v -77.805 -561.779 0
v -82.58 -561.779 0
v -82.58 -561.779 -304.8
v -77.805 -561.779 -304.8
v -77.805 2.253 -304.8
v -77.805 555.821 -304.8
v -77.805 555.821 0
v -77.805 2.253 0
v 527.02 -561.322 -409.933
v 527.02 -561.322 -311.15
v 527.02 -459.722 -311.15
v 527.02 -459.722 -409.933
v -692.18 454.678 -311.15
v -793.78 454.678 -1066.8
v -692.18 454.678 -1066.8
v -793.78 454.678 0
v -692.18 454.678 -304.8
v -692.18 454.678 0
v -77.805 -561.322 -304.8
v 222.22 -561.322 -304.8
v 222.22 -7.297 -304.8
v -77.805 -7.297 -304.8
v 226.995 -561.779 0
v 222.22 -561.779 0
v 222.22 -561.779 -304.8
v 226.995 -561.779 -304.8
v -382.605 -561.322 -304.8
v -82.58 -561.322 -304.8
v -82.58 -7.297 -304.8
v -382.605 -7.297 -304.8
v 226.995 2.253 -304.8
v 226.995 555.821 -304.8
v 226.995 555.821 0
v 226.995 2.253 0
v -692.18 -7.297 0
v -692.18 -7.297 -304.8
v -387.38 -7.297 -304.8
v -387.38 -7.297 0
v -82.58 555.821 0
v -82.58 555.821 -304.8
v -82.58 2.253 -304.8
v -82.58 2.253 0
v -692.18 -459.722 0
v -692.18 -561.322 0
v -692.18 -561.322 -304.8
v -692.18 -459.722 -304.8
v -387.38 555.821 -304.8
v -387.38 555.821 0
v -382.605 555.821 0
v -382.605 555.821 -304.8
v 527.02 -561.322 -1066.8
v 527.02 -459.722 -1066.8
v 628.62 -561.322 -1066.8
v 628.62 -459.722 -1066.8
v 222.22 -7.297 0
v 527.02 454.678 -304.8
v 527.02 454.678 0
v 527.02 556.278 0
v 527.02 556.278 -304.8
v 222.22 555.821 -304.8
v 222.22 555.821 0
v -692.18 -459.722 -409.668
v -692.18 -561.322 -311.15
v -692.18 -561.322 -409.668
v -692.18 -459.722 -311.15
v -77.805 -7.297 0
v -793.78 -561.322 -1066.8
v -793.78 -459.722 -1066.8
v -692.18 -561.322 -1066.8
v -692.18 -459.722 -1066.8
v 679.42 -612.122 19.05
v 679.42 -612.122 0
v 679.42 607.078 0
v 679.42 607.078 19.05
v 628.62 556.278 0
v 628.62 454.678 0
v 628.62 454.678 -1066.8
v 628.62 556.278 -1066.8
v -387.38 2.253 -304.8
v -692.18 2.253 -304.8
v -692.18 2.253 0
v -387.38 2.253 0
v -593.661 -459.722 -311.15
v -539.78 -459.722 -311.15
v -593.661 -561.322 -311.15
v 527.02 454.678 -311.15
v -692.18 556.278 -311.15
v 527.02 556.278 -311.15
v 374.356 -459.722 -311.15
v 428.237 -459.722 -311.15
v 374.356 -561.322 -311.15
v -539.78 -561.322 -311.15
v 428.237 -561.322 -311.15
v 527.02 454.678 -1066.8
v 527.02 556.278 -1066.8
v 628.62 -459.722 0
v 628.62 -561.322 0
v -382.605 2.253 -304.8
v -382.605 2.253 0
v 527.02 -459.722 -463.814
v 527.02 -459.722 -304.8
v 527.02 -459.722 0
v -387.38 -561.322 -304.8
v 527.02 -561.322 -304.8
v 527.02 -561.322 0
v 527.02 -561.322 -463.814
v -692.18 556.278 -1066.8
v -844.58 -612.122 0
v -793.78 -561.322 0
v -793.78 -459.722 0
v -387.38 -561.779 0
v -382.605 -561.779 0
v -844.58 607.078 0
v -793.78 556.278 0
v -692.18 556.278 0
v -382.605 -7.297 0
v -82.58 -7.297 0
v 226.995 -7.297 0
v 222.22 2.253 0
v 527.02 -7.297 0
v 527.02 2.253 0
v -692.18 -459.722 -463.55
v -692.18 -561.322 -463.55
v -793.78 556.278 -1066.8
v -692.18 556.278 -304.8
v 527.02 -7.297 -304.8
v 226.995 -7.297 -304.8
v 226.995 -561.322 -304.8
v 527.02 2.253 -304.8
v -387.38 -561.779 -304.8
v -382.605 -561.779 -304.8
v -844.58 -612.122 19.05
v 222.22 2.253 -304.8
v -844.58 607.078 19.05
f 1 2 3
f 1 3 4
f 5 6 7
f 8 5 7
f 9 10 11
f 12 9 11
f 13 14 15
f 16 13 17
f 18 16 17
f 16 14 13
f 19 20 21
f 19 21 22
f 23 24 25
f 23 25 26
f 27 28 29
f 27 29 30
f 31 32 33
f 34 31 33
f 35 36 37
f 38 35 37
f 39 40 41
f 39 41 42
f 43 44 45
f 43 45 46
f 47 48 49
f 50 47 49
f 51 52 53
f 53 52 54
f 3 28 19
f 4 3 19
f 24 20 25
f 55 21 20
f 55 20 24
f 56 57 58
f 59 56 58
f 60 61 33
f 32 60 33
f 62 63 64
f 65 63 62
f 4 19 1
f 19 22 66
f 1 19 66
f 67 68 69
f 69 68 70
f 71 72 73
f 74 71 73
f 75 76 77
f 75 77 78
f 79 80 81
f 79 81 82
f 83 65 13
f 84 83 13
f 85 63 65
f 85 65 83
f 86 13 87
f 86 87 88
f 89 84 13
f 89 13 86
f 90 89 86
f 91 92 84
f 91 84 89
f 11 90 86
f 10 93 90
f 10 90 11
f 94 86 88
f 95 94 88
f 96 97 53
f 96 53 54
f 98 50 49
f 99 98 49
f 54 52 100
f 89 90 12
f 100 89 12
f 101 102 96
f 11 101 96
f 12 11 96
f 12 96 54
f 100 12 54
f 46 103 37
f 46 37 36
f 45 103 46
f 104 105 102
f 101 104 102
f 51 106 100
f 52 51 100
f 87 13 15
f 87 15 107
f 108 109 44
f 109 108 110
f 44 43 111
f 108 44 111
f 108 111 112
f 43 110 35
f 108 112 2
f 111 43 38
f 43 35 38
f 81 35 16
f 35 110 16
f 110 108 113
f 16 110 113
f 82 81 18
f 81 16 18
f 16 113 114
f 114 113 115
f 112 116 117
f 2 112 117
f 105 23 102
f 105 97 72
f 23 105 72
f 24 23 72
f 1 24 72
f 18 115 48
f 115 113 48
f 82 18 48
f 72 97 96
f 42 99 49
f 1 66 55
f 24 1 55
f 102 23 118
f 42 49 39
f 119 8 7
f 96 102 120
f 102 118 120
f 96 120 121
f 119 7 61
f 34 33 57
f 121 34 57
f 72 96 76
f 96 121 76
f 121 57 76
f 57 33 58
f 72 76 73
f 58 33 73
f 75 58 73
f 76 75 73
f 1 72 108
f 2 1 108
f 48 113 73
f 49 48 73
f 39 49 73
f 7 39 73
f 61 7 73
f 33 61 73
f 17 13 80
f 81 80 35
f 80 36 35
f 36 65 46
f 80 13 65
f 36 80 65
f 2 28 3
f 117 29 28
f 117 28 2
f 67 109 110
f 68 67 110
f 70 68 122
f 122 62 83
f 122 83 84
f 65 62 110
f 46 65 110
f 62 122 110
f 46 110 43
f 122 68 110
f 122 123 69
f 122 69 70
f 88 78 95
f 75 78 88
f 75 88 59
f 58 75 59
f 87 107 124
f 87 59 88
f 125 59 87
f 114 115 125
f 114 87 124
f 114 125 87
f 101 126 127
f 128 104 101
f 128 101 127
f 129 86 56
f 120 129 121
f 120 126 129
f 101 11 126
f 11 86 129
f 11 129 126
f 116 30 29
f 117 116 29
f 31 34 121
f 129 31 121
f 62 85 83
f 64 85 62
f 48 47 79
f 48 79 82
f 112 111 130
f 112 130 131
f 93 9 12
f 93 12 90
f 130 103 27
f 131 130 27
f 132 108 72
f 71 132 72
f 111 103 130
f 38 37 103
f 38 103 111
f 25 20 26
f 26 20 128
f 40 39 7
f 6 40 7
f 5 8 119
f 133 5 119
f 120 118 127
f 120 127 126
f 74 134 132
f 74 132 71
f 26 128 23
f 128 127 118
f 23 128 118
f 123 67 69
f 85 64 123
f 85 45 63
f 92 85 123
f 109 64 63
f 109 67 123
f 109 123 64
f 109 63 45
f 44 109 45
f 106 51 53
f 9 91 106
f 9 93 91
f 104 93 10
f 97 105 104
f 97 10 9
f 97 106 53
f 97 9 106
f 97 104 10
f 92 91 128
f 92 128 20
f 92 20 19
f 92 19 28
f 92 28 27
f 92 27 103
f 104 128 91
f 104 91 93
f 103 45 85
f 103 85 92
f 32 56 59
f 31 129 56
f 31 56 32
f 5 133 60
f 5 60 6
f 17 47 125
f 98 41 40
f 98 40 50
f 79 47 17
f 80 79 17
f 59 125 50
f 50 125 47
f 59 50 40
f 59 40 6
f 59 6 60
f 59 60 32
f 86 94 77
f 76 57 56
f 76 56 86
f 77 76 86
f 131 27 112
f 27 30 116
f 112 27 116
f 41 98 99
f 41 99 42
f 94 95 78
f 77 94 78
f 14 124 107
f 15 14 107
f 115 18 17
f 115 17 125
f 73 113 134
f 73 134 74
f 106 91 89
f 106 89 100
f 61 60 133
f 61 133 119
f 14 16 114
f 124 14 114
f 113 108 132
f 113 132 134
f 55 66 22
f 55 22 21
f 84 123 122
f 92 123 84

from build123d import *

# Parameters (mm, degrees)
F0_W      = 1524
F0_H      = 1219.2
F1_DEPTH  = 19.05
F2_W      = 101.6
F2_H      = 101.6
F3_DEPTH  = 1066.8
F4_W      = 101.6
F4_H      = 6.35
F5_DEPTH  = 1219.2
F6_W      = 1219.2
F6_H      = 6.35
F7_DEPTH  = 1016
F8_W      = 1219.2
F8_H      = 9.5504
F9_DEPTH  = 311.658
F10_W     = 4.7752
F10_H     = 304.8
F11_DEPTH = 554.482
F12_DEPTH = 563.118
F14_DEPTH = 101.6
F15_DEPTH = 101.6


with BuildPart() as f1:
    # F0 (on Top) → F1 (new body)
    with BuildSketch(Plane.XY):
        with Locations((-82.5799548888, -2.5221072137)):
            Rectangle(F0_W, F0_H)
    extrude(amount=F1_DEPTH)

    # F2 (on face) → F3 (join)
    with BuildSketch(Plane.XY):
        with Locations((-742.9799548888, -510.5221072137)):
            Rectangle(F2_W, F2_H)
        with Locations((577.8200451112, -510.5221072137)):
            Rectangle(F2_W, F2_H)
        with Locations((577.8200451112, 505.4778927863)):
            Rectangle(F2_W, F2_H)
        with Locations((-742.9799548888, 505.4778927863)):
            Rectangle(F2_W, F2_H)
    extrude(amount=-F3_DEPTH)

    # F4 (on face) → F5 (join, through all)
    with BuildSketch(Plane.YZ.offset(-692.1799548888)):
        with Locations((-510.5221072137, -307.975)):
            Rectangle(F4_W, F4_H)
    extrude(amount=F5_DEPTH)

    # F6 (on face) → F7 (join)
    with BuildSketch(Plane(origin=(0, -459.7221072137, 0), x_dir=(-1, 0, 0), z_dir=(0, 1, 0))):
        with Locations((82.5799548888, -307.975)):
            Rectangle(F6_W, F6_H)
    extrude(amount=F7_DEPTH)

    # F8 (on face) → F9 (join)
    with BuildSketch(Plane(origin=(0, 0, -311.15), x_dir=(1, 0, 0), z_dir=(0, 0, -1))):
        with Locations((-82.5799548888, 2.5221072137)):
            Rectangle(F8_W, F8_H)
    extrude(amount=-F9_DEPTH)

    # F10 (on face) → F11 (join)
    with BuildSketch(Plane.XZ.offset(7.2973072137)):
        with Locations((-384.9923548888, -152.4)):
            Rectangle(F10_W, F10_H)
        with Locations((-80.1923548888, -152.4)):
            Rectangle(F10_W, F10_H)
        with Locations((224.6076451112, -152.4)):
            Rectangle(F10_W, F10_H)
    extrude(amount=F11_DEPTH)

    # F10 (on face) → F12 (join)
    with BuildSketch(Plane.XZ.offset(7.2973072137)):
        with Locations((-384.9923548888, -152.4)):
            Rectangle(F10_W, F10_H)
        with Locations((-80.1923548888, -152.4)):
            Rectangle(F10_W, F10_H)
        with Locations((224.6076451112, -152.4)):
            Rectangle(F10_W, F10_H)
    extrude(amount=-F12_DEPTH)

    # F13 (on face) → F14 (join)
    with BuildSketch(Plane.XZ.offset(561.3221072137)):
        Polygon((-692.1799548888, -409.6684632736), (-692.1799548888, -463.55), (-539.7799548888, -311.15), (-593.6614916152, -311.15), align=None)
    extrude(amount=-F14_DEPTH)

    # F13 (on face) → F15 (join)
    with BuildSketch(Plane.XZ.offset(561.3221072137)):
        Polygon((428.2372277794, -311.15), (374.355691053, -311.15), (527.0200451112, -463.8143540582), (527.0200451112, -409.9328173318), align=None)
    extrude(amount=-F15_DEPTH)


solid = f1.part
